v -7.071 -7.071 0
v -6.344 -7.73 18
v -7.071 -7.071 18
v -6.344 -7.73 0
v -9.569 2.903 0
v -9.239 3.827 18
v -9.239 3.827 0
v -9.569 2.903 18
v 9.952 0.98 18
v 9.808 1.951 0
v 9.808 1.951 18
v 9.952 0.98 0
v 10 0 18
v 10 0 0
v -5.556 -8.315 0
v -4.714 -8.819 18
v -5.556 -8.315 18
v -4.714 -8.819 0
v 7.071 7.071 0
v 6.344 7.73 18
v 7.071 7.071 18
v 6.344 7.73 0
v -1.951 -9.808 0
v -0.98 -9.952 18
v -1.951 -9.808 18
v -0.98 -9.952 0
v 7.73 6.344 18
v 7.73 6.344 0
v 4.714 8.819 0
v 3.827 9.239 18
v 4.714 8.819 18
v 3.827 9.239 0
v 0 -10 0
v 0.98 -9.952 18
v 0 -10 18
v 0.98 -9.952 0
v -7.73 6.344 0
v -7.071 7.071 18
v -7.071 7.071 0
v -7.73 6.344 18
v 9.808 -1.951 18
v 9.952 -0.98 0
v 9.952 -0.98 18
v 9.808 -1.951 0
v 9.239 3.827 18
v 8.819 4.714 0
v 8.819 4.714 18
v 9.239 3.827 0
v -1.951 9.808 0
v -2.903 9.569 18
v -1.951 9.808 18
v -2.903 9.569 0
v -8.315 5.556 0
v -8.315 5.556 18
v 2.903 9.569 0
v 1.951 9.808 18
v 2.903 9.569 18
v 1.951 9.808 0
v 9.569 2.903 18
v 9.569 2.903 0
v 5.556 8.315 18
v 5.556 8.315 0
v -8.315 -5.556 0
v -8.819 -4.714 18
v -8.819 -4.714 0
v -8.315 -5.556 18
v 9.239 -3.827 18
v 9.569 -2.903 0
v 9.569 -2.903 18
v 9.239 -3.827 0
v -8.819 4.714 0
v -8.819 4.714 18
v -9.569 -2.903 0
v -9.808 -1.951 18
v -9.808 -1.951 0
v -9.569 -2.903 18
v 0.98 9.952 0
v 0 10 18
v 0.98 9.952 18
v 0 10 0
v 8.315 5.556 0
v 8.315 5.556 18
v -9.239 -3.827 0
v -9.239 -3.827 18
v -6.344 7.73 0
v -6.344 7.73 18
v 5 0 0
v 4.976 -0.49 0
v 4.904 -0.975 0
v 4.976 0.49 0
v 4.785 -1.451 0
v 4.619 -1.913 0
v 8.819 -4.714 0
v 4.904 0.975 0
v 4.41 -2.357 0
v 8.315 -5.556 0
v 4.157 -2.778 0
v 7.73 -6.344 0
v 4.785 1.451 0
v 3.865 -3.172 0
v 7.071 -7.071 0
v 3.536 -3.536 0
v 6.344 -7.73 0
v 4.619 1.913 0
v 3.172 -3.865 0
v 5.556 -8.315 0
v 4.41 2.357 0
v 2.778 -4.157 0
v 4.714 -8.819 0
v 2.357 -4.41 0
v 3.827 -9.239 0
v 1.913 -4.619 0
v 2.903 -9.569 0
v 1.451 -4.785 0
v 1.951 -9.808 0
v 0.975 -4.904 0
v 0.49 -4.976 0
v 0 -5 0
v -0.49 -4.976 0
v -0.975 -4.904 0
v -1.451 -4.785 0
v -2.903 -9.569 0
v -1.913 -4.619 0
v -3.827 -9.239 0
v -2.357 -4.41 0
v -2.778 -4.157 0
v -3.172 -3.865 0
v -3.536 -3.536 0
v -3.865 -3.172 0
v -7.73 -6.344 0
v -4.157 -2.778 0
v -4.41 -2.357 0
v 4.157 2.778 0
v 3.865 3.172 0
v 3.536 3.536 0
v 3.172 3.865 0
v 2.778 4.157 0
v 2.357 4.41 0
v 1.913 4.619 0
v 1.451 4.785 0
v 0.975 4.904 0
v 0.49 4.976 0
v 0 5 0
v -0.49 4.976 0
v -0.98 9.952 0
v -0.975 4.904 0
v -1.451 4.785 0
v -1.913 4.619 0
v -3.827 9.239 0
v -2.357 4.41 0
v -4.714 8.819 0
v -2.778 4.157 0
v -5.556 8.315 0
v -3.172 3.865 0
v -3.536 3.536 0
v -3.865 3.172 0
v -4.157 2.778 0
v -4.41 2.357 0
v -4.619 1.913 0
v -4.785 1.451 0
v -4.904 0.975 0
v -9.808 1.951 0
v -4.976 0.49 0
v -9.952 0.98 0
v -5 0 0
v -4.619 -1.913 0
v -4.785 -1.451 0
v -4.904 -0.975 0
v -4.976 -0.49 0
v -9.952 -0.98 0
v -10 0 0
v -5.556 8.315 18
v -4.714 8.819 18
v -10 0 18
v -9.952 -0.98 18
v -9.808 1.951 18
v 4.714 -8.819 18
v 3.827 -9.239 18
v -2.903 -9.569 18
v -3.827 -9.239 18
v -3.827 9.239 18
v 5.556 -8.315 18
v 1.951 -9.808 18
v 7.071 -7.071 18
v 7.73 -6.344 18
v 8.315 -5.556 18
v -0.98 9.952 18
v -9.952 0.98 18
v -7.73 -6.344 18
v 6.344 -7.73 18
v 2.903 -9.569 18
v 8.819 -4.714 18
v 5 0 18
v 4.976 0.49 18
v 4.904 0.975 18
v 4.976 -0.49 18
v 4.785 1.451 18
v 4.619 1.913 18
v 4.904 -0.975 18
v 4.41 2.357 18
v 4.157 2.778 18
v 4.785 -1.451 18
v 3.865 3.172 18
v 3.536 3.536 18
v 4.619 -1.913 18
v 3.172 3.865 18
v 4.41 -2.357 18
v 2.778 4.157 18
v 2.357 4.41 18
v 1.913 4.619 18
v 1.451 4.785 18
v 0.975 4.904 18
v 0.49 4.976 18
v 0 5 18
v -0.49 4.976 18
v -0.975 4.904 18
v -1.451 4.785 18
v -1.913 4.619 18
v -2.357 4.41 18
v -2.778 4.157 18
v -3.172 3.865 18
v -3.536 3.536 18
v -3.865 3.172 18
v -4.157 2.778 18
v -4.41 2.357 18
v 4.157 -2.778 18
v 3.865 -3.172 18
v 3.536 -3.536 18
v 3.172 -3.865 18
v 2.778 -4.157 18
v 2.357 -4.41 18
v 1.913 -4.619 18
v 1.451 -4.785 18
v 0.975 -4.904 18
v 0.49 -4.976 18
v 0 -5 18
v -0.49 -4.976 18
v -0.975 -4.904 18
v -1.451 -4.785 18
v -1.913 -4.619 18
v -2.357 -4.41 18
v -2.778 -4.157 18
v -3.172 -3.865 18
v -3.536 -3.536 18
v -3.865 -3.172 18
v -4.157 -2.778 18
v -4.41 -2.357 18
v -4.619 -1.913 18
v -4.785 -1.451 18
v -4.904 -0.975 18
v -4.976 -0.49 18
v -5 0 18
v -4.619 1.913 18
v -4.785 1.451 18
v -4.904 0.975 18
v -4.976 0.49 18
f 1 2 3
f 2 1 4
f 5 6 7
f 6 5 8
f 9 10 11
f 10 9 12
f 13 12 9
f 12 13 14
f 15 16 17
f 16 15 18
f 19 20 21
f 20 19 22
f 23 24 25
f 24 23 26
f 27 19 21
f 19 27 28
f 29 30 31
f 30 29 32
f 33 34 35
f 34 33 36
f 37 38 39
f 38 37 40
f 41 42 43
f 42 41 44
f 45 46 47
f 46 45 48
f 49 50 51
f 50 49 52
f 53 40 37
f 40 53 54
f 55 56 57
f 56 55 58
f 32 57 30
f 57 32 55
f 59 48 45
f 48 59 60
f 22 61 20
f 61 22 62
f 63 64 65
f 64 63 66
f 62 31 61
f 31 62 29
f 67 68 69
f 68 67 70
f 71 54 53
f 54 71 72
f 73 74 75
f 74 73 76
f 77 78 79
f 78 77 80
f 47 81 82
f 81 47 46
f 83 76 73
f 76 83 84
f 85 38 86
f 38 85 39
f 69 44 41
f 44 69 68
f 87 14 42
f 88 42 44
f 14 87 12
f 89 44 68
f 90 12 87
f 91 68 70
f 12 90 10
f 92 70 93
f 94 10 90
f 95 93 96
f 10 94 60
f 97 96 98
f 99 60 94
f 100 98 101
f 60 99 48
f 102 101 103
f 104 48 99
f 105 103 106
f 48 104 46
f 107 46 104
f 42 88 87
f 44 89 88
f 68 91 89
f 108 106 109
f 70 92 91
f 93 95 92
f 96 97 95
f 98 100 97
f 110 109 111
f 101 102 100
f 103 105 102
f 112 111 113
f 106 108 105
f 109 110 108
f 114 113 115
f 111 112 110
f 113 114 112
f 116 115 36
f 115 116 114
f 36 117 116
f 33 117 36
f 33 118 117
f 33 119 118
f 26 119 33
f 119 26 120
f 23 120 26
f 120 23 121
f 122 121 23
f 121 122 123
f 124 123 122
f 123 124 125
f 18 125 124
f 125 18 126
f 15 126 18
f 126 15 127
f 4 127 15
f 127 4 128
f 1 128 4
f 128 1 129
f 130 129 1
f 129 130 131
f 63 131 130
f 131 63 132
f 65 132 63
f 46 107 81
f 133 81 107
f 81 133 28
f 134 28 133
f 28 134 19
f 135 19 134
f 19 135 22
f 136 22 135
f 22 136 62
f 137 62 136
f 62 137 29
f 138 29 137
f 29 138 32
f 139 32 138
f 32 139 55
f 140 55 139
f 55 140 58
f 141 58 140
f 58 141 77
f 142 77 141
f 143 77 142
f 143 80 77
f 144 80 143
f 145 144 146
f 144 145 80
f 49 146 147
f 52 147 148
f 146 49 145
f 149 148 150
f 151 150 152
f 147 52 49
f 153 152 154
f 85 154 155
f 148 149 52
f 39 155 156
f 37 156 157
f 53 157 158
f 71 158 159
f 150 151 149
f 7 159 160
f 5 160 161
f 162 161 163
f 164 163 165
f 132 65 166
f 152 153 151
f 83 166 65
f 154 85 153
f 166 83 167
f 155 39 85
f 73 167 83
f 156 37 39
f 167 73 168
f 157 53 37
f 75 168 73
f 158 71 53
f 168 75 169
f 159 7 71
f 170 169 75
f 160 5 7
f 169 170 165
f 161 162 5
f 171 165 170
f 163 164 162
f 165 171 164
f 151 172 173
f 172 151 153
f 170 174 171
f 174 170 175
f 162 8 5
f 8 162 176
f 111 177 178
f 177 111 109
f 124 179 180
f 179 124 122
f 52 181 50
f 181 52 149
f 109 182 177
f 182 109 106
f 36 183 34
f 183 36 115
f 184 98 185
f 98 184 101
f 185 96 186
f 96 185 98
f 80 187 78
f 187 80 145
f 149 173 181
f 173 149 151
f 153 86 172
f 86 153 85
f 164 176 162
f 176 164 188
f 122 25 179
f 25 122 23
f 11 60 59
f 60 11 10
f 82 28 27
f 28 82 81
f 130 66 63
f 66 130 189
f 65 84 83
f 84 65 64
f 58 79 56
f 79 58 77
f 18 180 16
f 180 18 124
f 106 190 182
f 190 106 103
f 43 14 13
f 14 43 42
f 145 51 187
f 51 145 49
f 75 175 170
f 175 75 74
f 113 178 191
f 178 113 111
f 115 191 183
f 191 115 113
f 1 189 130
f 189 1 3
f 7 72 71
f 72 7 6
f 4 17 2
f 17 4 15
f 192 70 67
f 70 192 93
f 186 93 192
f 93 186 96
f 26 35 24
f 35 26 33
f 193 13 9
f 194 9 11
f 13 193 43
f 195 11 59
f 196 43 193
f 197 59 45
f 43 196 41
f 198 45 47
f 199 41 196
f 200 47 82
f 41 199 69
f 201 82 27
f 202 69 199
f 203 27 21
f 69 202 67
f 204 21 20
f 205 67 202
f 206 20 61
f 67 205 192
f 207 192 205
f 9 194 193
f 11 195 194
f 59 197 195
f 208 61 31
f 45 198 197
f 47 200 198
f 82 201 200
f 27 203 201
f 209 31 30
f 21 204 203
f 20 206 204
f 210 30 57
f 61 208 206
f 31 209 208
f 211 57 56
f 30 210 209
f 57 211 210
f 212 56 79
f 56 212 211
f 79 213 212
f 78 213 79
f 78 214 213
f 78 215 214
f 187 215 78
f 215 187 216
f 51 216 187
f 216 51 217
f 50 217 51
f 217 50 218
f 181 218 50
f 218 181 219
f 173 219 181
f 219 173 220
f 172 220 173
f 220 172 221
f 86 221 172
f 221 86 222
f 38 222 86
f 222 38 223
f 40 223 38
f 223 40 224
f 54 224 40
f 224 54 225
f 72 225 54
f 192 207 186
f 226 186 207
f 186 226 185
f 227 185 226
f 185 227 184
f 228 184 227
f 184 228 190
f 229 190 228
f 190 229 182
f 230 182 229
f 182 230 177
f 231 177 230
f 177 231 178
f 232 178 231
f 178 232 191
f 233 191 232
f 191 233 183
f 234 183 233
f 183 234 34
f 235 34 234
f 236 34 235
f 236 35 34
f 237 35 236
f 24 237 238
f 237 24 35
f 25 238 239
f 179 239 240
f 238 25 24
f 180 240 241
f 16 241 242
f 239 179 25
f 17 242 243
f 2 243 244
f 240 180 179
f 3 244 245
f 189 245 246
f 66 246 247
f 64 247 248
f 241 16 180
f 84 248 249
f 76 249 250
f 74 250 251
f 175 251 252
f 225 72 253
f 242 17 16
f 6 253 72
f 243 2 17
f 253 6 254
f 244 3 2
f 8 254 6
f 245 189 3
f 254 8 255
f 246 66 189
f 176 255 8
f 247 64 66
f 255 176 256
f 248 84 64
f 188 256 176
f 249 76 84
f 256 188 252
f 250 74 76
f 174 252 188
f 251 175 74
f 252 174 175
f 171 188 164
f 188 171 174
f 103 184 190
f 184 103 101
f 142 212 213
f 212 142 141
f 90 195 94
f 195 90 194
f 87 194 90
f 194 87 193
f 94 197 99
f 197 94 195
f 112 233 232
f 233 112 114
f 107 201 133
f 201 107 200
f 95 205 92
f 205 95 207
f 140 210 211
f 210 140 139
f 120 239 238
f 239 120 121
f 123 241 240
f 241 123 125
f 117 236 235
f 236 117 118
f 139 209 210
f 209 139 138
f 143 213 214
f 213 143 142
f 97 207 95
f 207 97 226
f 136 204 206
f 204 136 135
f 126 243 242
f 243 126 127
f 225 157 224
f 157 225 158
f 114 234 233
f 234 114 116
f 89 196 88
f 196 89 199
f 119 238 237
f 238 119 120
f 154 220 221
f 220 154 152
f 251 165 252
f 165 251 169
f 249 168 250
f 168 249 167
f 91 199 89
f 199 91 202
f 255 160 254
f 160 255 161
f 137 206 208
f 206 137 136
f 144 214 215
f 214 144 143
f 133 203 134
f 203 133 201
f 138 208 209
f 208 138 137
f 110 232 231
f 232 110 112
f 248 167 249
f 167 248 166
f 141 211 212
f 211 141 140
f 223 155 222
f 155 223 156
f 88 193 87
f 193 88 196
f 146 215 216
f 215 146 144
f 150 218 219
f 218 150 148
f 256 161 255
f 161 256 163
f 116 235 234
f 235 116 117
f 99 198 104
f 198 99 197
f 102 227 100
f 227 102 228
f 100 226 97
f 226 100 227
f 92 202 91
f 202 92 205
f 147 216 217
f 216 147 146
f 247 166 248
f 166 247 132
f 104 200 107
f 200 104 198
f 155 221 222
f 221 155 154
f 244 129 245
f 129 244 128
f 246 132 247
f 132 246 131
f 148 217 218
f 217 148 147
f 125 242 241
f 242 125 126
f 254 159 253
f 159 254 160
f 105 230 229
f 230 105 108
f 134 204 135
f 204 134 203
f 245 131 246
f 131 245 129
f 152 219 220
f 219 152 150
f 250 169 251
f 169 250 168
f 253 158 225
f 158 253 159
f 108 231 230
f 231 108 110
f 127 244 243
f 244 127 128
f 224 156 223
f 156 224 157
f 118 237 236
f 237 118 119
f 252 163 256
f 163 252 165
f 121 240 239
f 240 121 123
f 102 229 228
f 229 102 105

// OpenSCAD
difference() {
    cylinder(h=18, d=20, $fn=64);
    translate([0, 0, -1])
        cylinder(h=20, d=10, $fn=64);
}
